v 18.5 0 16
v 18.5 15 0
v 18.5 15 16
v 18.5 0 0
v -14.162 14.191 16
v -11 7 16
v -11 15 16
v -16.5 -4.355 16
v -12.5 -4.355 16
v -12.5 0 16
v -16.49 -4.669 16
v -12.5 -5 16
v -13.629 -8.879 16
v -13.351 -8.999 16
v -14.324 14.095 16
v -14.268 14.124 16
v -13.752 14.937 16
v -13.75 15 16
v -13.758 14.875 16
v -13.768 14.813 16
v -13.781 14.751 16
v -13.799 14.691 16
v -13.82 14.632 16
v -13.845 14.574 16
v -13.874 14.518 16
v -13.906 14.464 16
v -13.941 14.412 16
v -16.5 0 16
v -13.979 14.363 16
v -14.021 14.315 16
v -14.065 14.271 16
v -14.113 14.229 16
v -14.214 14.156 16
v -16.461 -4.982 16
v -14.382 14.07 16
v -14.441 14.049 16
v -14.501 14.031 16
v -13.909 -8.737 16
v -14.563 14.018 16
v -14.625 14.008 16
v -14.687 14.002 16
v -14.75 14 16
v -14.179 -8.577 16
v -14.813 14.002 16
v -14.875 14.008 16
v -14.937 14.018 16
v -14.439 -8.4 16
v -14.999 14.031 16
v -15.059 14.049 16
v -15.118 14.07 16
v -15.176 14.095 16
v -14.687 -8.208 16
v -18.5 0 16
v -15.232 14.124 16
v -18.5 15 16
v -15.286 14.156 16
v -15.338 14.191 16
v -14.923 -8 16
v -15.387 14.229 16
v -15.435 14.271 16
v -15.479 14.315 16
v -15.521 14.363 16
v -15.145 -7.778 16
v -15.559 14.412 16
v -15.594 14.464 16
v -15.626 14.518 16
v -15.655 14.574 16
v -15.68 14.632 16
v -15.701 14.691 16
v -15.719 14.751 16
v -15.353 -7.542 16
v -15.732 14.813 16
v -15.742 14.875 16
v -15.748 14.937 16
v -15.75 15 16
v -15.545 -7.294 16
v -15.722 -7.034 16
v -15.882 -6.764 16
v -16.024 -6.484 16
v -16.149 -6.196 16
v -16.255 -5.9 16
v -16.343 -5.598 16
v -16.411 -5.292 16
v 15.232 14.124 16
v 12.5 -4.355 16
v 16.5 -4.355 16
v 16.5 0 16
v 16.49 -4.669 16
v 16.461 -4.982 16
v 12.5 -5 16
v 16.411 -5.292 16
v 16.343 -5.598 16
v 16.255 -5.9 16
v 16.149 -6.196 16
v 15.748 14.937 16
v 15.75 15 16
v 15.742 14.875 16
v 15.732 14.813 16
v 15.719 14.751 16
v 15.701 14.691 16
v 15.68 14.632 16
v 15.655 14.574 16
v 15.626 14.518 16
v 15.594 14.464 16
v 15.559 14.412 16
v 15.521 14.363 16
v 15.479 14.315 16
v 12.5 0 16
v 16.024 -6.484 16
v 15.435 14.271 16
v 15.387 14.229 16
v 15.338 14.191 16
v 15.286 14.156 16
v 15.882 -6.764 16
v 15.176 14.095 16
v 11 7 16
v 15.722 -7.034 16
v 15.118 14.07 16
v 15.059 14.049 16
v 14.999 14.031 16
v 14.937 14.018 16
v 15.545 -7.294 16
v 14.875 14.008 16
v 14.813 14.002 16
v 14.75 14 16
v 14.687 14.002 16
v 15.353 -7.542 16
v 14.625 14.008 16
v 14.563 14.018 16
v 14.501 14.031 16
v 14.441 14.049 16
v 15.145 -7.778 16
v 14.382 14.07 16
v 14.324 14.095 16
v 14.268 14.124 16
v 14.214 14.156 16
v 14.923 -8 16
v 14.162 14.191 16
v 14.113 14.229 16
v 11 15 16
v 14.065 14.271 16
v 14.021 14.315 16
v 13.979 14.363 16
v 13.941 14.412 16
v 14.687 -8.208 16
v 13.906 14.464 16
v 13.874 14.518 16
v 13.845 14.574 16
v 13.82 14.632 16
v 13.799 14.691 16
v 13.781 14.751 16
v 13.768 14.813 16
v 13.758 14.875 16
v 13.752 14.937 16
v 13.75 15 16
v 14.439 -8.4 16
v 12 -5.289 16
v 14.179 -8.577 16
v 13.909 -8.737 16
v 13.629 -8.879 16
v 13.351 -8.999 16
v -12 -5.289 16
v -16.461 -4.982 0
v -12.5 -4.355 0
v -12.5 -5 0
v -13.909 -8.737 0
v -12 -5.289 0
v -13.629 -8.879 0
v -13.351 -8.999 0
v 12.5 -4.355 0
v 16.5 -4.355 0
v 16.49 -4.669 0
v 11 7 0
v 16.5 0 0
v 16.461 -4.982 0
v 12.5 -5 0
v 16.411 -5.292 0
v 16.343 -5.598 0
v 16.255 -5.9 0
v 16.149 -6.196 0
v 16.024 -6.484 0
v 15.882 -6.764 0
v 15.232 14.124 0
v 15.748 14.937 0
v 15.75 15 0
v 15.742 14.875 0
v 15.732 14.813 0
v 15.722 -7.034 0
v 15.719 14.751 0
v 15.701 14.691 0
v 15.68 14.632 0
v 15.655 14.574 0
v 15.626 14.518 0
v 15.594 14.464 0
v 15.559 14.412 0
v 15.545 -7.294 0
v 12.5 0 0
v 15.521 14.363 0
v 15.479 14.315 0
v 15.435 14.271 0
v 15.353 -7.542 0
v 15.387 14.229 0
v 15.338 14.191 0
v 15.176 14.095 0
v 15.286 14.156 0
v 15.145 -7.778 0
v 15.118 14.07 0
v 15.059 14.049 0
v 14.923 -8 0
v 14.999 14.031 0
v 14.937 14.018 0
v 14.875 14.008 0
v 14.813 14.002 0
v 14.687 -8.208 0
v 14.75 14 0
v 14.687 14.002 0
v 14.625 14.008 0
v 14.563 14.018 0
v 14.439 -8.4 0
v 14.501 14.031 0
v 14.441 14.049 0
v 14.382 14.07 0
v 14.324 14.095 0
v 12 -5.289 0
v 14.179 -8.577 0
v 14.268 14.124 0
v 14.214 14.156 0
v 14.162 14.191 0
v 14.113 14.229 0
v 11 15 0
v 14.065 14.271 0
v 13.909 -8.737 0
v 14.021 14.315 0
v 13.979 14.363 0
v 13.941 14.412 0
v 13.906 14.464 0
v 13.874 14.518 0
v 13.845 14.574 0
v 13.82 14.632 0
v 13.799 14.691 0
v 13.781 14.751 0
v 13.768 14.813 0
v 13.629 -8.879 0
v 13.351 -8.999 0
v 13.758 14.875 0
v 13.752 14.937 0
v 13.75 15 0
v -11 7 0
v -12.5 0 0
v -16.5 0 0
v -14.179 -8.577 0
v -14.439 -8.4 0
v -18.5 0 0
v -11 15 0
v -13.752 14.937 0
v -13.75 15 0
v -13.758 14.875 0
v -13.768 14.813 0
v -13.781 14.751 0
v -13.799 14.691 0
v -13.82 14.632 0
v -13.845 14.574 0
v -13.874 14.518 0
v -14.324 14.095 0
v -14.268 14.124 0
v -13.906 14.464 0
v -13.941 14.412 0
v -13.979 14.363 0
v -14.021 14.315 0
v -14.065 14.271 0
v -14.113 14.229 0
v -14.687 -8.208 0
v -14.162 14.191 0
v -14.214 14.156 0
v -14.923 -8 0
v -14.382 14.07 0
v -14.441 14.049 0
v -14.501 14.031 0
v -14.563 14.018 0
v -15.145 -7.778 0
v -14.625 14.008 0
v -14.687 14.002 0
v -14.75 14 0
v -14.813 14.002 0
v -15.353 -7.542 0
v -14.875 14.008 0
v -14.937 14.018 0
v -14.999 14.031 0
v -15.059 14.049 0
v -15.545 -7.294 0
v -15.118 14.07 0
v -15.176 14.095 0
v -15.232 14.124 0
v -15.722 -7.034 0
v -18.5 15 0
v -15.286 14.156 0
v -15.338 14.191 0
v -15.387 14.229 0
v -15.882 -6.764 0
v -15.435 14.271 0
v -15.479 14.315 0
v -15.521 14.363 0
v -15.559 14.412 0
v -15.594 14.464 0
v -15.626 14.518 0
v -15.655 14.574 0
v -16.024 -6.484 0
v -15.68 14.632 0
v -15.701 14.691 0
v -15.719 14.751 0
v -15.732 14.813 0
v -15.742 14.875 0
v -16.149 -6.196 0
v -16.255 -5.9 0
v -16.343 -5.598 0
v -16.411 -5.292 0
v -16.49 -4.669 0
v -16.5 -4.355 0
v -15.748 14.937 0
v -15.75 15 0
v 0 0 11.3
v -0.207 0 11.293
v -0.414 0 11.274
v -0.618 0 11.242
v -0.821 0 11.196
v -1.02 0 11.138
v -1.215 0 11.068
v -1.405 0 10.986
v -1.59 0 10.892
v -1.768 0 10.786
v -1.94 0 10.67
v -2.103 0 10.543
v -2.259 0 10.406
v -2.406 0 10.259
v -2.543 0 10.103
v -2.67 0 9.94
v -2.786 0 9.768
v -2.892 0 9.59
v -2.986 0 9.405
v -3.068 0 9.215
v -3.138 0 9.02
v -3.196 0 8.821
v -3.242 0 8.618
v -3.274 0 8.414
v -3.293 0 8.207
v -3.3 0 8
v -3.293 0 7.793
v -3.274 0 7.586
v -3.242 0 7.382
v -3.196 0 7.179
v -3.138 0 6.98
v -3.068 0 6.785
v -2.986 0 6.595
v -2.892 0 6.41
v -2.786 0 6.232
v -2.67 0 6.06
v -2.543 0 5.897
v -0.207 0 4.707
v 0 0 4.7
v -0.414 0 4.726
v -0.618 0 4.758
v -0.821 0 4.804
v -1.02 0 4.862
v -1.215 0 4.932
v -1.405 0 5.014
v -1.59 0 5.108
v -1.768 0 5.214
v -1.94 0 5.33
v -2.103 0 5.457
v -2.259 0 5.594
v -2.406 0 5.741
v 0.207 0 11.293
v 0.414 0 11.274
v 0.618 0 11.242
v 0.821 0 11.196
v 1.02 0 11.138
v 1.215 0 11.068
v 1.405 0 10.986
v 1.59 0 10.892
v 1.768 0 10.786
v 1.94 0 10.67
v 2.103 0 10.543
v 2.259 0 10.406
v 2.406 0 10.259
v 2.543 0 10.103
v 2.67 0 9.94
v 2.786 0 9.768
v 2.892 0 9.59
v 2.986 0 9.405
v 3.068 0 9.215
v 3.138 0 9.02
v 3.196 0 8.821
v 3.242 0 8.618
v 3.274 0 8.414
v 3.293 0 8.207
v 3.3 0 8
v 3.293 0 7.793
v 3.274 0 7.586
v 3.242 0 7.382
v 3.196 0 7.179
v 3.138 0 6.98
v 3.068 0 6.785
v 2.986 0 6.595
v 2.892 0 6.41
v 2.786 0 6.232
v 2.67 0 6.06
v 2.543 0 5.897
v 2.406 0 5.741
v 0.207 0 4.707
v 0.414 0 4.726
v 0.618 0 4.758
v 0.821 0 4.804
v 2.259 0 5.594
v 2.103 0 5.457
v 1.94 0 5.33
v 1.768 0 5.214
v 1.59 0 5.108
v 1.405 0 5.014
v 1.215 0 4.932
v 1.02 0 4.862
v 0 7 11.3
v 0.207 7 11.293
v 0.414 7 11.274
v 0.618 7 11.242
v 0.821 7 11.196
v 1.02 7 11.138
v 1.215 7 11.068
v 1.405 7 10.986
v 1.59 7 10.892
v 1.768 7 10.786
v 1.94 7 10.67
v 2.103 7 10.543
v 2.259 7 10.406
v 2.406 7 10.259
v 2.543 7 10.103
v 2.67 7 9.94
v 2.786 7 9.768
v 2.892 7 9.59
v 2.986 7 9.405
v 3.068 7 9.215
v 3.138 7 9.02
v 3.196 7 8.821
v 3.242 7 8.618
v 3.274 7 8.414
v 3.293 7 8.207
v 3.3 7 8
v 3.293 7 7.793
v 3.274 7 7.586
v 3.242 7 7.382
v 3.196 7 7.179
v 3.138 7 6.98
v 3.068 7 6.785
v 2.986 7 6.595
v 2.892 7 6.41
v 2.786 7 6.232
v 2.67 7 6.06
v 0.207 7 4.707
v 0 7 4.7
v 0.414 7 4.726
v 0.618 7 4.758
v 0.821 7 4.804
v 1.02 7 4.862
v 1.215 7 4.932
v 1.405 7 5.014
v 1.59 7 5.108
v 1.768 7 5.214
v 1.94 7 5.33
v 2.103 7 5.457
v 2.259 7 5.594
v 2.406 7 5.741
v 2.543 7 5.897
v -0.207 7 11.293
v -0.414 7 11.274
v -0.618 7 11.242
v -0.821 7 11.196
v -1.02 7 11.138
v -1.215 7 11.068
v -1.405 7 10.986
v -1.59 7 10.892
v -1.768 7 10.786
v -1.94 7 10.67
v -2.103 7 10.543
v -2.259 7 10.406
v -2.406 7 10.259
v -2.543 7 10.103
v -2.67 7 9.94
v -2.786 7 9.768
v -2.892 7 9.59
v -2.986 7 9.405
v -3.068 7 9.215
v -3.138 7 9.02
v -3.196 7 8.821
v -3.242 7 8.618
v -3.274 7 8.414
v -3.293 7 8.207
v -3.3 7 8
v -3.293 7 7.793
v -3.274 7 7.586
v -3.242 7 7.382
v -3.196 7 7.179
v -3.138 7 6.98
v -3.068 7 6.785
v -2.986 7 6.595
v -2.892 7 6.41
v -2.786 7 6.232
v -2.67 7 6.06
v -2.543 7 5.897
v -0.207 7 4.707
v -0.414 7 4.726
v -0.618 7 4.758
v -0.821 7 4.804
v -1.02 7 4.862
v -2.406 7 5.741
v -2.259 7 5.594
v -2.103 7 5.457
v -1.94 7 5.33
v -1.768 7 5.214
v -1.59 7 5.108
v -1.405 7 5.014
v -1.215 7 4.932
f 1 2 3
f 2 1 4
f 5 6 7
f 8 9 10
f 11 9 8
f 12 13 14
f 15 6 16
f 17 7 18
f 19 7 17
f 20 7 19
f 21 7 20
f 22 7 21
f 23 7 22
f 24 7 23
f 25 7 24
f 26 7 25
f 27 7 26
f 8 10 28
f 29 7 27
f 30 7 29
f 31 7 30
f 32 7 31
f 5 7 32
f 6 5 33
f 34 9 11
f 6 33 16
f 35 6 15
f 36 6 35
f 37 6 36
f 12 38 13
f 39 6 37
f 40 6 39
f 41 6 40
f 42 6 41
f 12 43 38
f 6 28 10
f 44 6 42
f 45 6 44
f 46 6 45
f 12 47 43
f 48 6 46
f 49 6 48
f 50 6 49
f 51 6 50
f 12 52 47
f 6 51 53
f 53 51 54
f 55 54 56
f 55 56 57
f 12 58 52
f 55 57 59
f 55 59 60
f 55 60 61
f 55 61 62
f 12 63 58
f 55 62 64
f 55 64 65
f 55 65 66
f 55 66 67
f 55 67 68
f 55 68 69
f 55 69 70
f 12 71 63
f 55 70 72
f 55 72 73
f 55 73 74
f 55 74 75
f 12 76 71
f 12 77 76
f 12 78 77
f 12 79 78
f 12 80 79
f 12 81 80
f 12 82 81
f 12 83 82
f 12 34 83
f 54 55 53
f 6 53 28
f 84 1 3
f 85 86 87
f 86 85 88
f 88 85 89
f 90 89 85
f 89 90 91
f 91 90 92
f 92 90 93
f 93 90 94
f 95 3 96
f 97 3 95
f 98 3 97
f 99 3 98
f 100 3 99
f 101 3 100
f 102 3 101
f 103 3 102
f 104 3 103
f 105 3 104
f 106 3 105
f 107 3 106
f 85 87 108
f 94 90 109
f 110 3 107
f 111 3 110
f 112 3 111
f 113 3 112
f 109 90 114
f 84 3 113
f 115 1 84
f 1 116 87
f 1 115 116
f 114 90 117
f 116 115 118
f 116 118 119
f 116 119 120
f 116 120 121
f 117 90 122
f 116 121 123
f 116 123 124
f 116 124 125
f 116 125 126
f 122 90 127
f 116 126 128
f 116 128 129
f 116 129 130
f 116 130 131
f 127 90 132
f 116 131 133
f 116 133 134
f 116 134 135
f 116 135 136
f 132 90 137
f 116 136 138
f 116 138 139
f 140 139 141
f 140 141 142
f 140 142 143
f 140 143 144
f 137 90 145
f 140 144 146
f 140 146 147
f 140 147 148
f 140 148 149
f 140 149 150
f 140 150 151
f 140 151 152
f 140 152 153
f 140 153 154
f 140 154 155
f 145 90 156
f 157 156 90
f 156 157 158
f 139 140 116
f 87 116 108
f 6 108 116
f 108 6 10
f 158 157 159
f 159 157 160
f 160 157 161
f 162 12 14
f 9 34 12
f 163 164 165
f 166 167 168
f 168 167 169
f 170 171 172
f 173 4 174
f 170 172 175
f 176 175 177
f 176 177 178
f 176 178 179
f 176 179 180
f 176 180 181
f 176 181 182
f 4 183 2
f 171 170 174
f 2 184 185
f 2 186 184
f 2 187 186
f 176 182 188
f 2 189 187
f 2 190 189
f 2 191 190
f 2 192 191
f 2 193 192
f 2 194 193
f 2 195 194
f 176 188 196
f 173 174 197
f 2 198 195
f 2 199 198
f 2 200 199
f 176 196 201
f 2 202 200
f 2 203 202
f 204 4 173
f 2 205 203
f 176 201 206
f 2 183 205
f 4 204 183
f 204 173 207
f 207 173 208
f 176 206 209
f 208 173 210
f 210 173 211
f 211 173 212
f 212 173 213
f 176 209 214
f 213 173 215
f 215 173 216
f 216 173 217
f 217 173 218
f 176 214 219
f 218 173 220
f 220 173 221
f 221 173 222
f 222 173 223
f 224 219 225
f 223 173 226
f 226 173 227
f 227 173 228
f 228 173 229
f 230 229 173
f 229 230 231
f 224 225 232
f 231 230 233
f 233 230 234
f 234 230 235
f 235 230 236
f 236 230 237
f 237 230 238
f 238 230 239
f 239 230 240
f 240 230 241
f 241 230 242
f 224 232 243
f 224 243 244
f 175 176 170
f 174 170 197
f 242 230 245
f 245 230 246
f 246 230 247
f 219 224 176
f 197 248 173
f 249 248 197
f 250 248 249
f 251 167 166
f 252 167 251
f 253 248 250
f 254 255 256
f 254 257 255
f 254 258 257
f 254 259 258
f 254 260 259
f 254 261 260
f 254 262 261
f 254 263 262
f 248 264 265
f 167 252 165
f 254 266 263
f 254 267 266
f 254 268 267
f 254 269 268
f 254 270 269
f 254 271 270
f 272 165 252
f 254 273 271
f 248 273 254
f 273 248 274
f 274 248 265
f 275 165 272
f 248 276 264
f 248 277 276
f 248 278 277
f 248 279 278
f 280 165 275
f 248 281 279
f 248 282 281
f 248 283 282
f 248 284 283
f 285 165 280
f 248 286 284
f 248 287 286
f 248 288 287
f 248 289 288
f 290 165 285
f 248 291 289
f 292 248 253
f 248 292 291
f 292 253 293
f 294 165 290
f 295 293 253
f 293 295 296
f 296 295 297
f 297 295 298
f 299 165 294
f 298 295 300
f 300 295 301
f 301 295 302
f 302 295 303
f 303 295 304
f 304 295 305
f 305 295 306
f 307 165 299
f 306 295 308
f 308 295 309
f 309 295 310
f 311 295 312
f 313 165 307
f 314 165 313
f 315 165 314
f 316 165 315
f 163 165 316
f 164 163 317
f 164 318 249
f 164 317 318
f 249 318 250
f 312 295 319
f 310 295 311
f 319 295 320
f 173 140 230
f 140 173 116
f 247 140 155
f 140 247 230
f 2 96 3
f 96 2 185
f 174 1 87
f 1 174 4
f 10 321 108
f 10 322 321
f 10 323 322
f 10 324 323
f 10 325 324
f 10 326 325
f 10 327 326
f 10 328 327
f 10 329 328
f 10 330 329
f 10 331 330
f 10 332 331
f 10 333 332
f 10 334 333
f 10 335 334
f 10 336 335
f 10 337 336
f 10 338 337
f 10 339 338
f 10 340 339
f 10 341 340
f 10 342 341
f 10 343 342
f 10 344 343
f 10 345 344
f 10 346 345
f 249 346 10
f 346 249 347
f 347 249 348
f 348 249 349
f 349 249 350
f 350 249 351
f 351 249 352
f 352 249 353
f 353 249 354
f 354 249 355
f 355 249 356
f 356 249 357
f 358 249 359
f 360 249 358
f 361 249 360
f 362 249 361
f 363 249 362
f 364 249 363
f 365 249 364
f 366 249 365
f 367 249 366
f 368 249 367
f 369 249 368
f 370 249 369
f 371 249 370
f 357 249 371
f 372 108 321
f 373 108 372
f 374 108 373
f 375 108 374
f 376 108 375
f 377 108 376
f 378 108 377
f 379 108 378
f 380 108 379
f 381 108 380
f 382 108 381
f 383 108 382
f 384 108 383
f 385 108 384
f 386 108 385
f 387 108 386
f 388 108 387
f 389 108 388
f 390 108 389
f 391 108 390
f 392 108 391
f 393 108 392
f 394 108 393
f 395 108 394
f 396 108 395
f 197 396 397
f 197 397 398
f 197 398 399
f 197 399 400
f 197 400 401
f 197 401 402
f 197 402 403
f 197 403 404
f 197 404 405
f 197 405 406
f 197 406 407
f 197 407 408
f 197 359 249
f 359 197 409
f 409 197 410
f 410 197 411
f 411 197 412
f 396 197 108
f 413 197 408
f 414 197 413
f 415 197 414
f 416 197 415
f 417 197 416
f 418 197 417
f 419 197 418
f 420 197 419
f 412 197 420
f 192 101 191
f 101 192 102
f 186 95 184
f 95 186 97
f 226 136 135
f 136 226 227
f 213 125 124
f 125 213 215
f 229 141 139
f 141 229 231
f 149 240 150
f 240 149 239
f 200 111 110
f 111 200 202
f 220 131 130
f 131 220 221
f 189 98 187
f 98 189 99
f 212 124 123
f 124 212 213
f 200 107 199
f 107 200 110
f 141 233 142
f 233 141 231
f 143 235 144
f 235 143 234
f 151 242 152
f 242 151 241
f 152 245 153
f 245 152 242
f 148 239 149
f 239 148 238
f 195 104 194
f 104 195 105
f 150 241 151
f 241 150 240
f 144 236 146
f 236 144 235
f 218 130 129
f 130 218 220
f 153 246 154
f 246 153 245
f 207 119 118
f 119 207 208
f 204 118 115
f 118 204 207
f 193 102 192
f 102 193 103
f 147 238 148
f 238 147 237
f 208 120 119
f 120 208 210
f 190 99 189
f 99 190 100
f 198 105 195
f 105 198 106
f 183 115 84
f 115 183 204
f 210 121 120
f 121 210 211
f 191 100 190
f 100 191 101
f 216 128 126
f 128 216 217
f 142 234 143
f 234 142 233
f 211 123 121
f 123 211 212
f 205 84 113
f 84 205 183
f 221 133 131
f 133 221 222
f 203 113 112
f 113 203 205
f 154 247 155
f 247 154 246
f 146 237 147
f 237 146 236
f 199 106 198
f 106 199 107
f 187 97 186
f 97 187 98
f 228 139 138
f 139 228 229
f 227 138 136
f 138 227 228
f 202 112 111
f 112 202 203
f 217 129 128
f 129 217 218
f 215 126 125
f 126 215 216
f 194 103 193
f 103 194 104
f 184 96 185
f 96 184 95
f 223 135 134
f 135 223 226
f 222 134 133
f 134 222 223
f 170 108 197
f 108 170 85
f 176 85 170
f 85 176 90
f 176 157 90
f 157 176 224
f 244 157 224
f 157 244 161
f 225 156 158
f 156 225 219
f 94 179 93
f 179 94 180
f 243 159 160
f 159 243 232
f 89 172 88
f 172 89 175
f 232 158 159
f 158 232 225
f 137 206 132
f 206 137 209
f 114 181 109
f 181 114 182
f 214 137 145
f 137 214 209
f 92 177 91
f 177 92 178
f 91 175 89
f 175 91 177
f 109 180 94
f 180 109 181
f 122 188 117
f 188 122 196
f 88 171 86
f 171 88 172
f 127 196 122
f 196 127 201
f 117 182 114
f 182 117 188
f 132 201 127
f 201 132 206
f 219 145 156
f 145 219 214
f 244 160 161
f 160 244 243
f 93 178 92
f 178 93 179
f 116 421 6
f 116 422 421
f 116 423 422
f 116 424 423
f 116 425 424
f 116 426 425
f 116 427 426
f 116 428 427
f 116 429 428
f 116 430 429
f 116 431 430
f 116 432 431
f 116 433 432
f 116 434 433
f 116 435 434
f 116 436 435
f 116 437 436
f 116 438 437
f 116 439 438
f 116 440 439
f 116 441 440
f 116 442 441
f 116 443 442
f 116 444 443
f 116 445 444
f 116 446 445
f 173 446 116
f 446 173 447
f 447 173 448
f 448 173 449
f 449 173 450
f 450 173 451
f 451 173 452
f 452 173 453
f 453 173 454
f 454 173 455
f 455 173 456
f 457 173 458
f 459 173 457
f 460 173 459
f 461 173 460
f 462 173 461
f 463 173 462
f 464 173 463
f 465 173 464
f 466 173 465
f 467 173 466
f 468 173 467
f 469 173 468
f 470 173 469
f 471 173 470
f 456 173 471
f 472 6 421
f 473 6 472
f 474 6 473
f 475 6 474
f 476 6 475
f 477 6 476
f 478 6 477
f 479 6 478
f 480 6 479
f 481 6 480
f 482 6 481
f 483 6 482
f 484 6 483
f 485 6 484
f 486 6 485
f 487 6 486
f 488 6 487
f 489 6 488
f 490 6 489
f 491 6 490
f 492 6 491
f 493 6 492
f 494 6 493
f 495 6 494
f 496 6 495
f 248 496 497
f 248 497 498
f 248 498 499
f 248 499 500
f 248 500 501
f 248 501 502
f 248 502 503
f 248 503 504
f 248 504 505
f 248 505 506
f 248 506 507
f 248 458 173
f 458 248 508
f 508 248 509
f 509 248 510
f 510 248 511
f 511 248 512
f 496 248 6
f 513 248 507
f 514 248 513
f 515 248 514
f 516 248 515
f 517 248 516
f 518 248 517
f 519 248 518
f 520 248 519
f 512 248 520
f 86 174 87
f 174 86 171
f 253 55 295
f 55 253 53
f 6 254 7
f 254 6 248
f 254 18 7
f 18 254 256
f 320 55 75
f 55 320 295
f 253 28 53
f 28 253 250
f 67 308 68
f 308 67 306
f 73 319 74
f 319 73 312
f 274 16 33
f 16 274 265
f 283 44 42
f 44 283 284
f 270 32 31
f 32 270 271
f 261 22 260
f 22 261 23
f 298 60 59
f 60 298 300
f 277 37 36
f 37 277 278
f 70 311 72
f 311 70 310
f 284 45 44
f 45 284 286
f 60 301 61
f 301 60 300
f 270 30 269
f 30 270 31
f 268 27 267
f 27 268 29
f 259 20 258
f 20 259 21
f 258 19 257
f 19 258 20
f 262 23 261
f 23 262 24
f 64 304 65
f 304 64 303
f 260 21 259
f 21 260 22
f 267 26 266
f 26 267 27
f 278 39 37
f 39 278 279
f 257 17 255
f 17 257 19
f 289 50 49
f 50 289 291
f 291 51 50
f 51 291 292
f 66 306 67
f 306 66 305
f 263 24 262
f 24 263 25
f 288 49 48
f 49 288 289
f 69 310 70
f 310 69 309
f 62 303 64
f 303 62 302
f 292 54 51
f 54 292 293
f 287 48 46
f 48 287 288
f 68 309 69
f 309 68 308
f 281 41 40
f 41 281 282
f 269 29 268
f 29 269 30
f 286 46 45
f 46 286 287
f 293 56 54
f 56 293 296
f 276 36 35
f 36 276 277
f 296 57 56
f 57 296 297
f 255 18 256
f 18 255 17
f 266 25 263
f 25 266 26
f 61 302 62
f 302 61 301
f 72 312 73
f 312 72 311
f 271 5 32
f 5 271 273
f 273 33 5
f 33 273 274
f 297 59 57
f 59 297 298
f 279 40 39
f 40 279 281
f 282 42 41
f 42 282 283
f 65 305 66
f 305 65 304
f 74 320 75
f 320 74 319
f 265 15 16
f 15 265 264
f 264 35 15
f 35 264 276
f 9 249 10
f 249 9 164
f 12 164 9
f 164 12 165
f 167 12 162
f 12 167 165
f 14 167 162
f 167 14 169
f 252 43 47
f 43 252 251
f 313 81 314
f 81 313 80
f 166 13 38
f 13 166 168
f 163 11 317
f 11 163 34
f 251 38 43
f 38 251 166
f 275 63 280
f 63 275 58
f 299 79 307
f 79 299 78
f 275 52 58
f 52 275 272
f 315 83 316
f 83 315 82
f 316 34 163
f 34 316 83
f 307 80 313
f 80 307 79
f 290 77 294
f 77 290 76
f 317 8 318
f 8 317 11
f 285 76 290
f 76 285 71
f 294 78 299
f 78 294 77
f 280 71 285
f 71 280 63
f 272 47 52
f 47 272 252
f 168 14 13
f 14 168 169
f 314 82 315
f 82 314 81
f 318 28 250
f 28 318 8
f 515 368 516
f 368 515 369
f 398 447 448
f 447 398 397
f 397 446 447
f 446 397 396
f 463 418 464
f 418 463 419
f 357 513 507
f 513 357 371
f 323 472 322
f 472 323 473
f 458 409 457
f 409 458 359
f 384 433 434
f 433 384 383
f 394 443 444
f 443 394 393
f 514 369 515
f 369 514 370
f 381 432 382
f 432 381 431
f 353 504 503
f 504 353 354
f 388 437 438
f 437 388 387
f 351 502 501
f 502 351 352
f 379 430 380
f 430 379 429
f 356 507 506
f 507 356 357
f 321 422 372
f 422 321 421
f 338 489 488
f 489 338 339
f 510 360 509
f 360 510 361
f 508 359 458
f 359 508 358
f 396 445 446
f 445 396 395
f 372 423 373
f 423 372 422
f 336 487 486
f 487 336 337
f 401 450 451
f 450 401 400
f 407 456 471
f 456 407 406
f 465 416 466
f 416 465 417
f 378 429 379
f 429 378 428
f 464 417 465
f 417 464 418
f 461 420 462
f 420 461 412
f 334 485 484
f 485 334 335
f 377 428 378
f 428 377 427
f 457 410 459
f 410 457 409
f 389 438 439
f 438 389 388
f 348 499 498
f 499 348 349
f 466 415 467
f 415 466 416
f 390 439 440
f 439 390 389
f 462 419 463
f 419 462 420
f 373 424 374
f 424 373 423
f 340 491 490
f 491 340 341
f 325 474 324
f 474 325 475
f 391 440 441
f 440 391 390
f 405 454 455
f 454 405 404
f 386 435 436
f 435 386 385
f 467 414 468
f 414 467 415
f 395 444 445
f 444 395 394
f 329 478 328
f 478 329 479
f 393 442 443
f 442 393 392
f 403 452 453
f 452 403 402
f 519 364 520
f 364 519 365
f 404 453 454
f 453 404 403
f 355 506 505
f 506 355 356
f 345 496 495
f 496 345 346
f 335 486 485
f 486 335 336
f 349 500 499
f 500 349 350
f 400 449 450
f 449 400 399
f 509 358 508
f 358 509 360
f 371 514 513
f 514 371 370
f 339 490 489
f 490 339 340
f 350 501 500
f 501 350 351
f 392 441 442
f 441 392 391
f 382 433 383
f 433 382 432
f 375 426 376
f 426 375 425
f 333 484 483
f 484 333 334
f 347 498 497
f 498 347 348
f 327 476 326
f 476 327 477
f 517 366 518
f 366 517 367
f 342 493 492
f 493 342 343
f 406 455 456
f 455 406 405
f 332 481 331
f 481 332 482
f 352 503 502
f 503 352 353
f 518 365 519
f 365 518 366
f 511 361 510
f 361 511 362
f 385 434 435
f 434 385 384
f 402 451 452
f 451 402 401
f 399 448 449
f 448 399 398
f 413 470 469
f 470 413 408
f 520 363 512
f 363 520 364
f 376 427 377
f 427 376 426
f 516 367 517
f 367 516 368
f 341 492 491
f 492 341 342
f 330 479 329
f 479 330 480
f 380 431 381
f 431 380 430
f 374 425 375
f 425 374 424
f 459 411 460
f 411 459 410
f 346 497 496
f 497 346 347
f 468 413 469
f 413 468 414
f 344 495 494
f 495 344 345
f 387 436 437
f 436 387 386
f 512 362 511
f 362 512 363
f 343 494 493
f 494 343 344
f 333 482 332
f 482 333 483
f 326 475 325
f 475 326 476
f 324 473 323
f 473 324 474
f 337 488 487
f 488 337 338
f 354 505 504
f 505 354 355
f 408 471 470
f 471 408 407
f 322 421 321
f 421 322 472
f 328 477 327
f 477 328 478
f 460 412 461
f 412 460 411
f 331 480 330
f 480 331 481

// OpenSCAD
// Created from Code_Ybelt_holderA.stl
// https://github.com/Mecan0/Code
// By J.Rodigo (www.jra.so)
// Licence Creative commons atribution & share alike.

/**************************/
// Parámetros de la pieza  /
/**************************/

//Características del tornillo
dTor = 6.6;		// Diámetro de la rosca (6.6)


// Media Pieza
module mpieza(){
	// Bloque a lo largo del eje X
	cube([18.5, 7, 16]);
	// Bloque de sujeción para la correa
	difference(){
		// Bloque
		translate([11, 0, 0])
		cube([7.5, 15, 16]);
		// Zócalo para el diente de la parte B
		translate([14.75, 15, -1])
		rotate( 90, [0, 0, 1])
		cylinder(h = 18, r = 1, $fn=100);
	}
	// Soporte plano del clip
	translate([12.5, -4.355, 0])
	cube([4, 4.355, 16]);
	// Cabeza del soporte 
	clip();
}

// Cilindro operado en forma de clip 
module clip(){
	difference(){
		// Cilindro base 
		translate([11.5, -4.355, 0])
		rotate( 90, [0, 0, 1])
		cylinder(h = 16, r = 5, $fn=100);
		// Operaciones de vaciado 
		union(){
			translate([6.5, -5, -1])
			cube([6, 6, 18]);
		
			translate([12.5, -5, -1])
			rotate( 120, [0, 0, 1])
			cube([4, 6, 18]);
		
			translate([12, -5.288, -1])
			rotate( 200, [0, 0, 1])
			cube([5, 4, 18]);
		}
	}
}

// Taladro para el tornillo
module taladro(){
	translate([0, -1, 8])
	rotate( -90, [1, 0, 0])
	cylinder(h = 9, r = dTor/2, $fn=100);

}

// Creamos la pieza a partir de la mpieza() y le añadimos el taladro()
module pieza(){
	difference () {
		union() {
			// Pieza situada en +X
			mpieza();
			// Pieza situada en -X
			mirror([ 1, 0, 0 ])
			mpieza();
		}	
		// Taladro para el tornillo
		taladro();
	}
}

// Generamos la pieza!!

	pieza();
